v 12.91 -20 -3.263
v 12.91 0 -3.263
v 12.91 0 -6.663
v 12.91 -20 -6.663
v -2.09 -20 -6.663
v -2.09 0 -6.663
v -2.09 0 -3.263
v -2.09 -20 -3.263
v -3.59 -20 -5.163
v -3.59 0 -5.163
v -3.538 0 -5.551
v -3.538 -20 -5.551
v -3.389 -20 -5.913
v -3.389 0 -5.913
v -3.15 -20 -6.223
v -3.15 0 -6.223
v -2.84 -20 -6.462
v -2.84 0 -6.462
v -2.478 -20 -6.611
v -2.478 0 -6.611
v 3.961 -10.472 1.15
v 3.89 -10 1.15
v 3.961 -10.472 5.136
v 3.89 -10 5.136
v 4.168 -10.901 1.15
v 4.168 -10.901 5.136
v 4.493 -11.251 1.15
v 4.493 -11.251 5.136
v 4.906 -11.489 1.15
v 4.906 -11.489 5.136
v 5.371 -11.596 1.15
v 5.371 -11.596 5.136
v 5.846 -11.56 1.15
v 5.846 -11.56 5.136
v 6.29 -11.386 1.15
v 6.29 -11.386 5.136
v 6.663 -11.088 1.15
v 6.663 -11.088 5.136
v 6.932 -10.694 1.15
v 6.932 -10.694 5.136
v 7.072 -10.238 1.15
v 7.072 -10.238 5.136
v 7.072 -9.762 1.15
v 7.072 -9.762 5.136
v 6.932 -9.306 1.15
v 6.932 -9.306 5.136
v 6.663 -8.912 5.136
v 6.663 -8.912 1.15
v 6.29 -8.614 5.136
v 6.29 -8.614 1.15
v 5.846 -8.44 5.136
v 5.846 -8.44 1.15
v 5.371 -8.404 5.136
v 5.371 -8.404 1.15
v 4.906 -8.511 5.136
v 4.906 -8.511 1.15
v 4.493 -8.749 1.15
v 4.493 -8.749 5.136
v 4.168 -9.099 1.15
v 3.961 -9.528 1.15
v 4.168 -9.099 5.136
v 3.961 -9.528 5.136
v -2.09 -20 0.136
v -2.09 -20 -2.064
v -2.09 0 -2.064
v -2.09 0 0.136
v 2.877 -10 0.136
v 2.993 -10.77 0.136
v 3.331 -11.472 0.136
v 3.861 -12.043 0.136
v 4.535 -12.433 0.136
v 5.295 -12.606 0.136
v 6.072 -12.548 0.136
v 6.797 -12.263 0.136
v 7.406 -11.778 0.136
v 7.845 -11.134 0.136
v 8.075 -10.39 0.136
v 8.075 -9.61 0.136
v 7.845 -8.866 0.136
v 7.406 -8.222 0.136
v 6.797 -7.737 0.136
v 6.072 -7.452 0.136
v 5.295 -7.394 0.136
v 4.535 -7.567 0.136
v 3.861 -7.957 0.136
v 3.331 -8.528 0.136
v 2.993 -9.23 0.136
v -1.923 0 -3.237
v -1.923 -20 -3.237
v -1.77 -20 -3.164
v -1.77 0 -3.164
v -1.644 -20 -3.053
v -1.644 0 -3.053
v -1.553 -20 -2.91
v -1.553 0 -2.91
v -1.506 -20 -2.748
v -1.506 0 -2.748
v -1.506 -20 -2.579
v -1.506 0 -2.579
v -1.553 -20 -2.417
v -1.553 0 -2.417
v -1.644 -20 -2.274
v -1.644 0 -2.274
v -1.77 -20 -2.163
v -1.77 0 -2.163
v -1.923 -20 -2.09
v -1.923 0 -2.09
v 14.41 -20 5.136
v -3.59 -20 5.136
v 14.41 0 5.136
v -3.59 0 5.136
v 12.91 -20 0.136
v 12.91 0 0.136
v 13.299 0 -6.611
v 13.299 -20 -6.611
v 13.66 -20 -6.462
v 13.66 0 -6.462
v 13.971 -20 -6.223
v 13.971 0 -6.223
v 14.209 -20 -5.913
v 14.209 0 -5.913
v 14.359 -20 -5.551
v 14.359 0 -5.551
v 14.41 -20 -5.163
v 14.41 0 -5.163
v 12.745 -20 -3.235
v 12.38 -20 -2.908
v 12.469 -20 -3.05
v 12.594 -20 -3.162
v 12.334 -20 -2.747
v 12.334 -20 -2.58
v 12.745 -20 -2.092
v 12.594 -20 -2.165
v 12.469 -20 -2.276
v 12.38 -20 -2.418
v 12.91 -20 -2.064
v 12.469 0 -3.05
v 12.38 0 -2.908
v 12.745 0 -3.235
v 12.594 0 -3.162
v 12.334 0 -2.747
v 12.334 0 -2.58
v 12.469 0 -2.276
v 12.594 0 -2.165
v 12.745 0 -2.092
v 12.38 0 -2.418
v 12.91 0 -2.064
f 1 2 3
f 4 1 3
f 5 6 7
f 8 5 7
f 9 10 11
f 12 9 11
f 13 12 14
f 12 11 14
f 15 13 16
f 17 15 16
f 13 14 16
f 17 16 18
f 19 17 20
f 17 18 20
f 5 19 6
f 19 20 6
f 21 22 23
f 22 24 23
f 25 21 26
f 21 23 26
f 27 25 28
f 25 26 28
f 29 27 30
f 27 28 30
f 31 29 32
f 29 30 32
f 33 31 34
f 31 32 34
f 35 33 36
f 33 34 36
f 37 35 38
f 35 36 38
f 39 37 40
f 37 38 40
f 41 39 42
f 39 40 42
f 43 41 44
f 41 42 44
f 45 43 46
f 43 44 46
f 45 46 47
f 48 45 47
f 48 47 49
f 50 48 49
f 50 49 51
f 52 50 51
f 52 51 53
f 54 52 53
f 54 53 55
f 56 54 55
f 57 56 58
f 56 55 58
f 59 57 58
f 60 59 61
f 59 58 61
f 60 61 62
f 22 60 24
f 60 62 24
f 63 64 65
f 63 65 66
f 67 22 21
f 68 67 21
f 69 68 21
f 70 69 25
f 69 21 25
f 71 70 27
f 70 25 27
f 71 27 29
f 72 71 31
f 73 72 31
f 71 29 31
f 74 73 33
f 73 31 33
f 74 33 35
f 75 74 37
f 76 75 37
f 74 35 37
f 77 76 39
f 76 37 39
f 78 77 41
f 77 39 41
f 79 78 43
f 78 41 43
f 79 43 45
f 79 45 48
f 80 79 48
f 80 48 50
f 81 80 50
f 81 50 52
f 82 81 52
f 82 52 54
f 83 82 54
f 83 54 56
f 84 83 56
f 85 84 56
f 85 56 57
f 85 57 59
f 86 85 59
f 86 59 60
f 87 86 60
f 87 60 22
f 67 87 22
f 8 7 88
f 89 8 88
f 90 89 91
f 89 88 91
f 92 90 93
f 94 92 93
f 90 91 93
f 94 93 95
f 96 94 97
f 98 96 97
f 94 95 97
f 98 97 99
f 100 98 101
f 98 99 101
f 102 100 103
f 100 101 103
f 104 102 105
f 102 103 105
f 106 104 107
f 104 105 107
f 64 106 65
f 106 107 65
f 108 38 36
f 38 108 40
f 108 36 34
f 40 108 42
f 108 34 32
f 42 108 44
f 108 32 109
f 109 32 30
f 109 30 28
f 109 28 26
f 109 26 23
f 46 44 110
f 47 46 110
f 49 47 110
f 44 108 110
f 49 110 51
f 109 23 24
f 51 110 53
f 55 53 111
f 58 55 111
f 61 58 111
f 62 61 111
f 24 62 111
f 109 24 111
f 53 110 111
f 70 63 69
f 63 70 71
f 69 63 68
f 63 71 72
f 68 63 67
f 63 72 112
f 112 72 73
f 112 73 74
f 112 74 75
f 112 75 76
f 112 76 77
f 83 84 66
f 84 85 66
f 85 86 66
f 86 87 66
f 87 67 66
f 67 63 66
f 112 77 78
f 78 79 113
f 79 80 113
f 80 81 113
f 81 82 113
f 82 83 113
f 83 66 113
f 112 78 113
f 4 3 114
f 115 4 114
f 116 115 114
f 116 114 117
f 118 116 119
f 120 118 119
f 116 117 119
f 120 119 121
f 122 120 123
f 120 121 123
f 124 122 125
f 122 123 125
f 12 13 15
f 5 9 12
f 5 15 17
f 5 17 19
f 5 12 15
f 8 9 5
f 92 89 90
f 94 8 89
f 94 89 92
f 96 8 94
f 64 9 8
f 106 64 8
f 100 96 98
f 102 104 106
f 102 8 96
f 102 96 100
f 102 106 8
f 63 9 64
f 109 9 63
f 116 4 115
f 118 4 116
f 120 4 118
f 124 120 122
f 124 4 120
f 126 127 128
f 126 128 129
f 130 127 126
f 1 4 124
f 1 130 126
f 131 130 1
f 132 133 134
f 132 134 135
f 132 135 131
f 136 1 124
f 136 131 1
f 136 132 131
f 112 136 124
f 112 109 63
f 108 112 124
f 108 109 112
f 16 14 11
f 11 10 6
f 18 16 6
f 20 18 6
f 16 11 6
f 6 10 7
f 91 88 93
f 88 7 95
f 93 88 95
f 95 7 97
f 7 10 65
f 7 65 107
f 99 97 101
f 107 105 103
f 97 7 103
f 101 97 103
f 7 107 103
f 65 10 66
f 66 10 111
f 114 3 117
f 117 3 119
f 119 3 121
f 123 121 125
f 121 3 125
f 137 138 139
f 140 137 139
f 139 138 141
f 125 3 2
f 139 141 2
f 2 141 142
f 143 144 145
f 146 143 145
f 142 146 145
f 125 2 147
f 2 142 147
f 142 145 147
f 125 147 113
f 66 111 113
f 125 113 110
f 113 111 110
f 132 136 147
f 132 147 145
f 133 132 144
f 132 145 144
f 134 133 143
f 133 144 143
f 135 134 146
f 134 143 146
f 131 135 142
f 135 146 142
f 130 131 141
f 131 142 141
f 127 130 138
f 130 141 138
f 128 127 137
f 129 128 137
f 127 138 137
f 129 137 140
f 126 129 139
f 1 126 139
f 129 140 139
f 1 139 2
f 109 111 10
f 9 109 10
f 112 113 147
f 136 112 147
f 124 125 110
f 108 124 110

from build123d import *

# Parameters (mm, degrees)
F1_DEPTH       = 20
F3_D           = 3.2
F3_CSINK_D     = 5.5
F3_CSINK_ANGLE = 90
F4_DEPTH       = 20


with BuildPart() as f1:
    # F0 (on Front) → F1 (new body)
    with BuildSketch(Plane.XZ):
        with BuildLine():
            Line((14.4104288965, 5.1363992399), (-3.5895711035, 5.1363992399))
            Line((-3.5895711035, 5.1363992399), (-3.5895711035, 0.1363992399))
            Line((-3.5895711035, 0.1363992399), (-3.5895711035, -5.1626007601))
            ThreePointArc((-3.5895711035, -5.1626007601), (-3.1502312752, -6.2232609319), (-2.0895711035, -6.6626007601))
            Line((-2.0895711035, -6.6626007601), (-2.0895711035, -3.2634044741))
            Line((-2.0895711035, -3.2634044741), (-2.0895711035, -2.0636007601))
            Line((-2.0895711035, -2.0636007601), (-2.0895711035, 0.1363992399))
            Line((-2.0895711035, 0.1363992399), (5.4104288965, 0.1363992399))
            Line((5.4104288965, 0.1363992399), (12.9104288965, 0.1363992399))
            Line((12.9104288965, 0.1363992399), (12.9104288965, -2.0636007601))
            Line((12.9104288965, -2.0636007601), (12.9104288965, -3.2631007601))
            Line((12.9104288965, -3.2631007601), (12.9104288965, -6.6626007601))
            ThreePointArc((12.9104288965, -6.6626007601), (13.9710890683, -6.2232609319), (14.4104288965, -5.1626007601))
            Line((14.4104288965, -5.1626007601), (14.4104288965, -0.620780386))
            Line((14.4104288965, -0.620780386), (14.4104288965, 0.1363992399))
            Line((14.4104288965, 0.1363992399), (14.4104288965, 5.1363992399))
        make_face()
    extrude(amount=F1_DEPTH)

    # F3 (through all)
    with Locations(Plane(origin=(0, 0, 0), x_dir=(1, 0, 0), z_dir=(0, 0, -1))):
        with Locations((5.4901805706, 10)):
            CounterSinkHole(F3_D / 2, F3_CSINK_D / 2, counter_sink_angle=F3_CSINK_ANGLE)

    # F0 (on Front) → F4 (join)
    with BuildSketch(Plane.XZ):
        with BuildLine():
            Line((-2.0895711035, -2.0636007601), (-2.0895711035, -3.2634044741))
            ThreePointArc((-2.0895711035, -3.2634044741), (-1.5004229232, -2.6635026171), (-2.0895711035, -2.0636007601))
        make_face()
        with BuildLine():
            ThreePointArc((12.9104288965, -2.0636007601), (12.3277476003, -2.6633507601), (12.9104288965, -3.2631007601))
            Line((12.9104288965, -3.2631007601), (12.9104288965, -2.0636007601))
        make_face()
    extrude(amount=F4_DEPTH)


solid = f1.part
